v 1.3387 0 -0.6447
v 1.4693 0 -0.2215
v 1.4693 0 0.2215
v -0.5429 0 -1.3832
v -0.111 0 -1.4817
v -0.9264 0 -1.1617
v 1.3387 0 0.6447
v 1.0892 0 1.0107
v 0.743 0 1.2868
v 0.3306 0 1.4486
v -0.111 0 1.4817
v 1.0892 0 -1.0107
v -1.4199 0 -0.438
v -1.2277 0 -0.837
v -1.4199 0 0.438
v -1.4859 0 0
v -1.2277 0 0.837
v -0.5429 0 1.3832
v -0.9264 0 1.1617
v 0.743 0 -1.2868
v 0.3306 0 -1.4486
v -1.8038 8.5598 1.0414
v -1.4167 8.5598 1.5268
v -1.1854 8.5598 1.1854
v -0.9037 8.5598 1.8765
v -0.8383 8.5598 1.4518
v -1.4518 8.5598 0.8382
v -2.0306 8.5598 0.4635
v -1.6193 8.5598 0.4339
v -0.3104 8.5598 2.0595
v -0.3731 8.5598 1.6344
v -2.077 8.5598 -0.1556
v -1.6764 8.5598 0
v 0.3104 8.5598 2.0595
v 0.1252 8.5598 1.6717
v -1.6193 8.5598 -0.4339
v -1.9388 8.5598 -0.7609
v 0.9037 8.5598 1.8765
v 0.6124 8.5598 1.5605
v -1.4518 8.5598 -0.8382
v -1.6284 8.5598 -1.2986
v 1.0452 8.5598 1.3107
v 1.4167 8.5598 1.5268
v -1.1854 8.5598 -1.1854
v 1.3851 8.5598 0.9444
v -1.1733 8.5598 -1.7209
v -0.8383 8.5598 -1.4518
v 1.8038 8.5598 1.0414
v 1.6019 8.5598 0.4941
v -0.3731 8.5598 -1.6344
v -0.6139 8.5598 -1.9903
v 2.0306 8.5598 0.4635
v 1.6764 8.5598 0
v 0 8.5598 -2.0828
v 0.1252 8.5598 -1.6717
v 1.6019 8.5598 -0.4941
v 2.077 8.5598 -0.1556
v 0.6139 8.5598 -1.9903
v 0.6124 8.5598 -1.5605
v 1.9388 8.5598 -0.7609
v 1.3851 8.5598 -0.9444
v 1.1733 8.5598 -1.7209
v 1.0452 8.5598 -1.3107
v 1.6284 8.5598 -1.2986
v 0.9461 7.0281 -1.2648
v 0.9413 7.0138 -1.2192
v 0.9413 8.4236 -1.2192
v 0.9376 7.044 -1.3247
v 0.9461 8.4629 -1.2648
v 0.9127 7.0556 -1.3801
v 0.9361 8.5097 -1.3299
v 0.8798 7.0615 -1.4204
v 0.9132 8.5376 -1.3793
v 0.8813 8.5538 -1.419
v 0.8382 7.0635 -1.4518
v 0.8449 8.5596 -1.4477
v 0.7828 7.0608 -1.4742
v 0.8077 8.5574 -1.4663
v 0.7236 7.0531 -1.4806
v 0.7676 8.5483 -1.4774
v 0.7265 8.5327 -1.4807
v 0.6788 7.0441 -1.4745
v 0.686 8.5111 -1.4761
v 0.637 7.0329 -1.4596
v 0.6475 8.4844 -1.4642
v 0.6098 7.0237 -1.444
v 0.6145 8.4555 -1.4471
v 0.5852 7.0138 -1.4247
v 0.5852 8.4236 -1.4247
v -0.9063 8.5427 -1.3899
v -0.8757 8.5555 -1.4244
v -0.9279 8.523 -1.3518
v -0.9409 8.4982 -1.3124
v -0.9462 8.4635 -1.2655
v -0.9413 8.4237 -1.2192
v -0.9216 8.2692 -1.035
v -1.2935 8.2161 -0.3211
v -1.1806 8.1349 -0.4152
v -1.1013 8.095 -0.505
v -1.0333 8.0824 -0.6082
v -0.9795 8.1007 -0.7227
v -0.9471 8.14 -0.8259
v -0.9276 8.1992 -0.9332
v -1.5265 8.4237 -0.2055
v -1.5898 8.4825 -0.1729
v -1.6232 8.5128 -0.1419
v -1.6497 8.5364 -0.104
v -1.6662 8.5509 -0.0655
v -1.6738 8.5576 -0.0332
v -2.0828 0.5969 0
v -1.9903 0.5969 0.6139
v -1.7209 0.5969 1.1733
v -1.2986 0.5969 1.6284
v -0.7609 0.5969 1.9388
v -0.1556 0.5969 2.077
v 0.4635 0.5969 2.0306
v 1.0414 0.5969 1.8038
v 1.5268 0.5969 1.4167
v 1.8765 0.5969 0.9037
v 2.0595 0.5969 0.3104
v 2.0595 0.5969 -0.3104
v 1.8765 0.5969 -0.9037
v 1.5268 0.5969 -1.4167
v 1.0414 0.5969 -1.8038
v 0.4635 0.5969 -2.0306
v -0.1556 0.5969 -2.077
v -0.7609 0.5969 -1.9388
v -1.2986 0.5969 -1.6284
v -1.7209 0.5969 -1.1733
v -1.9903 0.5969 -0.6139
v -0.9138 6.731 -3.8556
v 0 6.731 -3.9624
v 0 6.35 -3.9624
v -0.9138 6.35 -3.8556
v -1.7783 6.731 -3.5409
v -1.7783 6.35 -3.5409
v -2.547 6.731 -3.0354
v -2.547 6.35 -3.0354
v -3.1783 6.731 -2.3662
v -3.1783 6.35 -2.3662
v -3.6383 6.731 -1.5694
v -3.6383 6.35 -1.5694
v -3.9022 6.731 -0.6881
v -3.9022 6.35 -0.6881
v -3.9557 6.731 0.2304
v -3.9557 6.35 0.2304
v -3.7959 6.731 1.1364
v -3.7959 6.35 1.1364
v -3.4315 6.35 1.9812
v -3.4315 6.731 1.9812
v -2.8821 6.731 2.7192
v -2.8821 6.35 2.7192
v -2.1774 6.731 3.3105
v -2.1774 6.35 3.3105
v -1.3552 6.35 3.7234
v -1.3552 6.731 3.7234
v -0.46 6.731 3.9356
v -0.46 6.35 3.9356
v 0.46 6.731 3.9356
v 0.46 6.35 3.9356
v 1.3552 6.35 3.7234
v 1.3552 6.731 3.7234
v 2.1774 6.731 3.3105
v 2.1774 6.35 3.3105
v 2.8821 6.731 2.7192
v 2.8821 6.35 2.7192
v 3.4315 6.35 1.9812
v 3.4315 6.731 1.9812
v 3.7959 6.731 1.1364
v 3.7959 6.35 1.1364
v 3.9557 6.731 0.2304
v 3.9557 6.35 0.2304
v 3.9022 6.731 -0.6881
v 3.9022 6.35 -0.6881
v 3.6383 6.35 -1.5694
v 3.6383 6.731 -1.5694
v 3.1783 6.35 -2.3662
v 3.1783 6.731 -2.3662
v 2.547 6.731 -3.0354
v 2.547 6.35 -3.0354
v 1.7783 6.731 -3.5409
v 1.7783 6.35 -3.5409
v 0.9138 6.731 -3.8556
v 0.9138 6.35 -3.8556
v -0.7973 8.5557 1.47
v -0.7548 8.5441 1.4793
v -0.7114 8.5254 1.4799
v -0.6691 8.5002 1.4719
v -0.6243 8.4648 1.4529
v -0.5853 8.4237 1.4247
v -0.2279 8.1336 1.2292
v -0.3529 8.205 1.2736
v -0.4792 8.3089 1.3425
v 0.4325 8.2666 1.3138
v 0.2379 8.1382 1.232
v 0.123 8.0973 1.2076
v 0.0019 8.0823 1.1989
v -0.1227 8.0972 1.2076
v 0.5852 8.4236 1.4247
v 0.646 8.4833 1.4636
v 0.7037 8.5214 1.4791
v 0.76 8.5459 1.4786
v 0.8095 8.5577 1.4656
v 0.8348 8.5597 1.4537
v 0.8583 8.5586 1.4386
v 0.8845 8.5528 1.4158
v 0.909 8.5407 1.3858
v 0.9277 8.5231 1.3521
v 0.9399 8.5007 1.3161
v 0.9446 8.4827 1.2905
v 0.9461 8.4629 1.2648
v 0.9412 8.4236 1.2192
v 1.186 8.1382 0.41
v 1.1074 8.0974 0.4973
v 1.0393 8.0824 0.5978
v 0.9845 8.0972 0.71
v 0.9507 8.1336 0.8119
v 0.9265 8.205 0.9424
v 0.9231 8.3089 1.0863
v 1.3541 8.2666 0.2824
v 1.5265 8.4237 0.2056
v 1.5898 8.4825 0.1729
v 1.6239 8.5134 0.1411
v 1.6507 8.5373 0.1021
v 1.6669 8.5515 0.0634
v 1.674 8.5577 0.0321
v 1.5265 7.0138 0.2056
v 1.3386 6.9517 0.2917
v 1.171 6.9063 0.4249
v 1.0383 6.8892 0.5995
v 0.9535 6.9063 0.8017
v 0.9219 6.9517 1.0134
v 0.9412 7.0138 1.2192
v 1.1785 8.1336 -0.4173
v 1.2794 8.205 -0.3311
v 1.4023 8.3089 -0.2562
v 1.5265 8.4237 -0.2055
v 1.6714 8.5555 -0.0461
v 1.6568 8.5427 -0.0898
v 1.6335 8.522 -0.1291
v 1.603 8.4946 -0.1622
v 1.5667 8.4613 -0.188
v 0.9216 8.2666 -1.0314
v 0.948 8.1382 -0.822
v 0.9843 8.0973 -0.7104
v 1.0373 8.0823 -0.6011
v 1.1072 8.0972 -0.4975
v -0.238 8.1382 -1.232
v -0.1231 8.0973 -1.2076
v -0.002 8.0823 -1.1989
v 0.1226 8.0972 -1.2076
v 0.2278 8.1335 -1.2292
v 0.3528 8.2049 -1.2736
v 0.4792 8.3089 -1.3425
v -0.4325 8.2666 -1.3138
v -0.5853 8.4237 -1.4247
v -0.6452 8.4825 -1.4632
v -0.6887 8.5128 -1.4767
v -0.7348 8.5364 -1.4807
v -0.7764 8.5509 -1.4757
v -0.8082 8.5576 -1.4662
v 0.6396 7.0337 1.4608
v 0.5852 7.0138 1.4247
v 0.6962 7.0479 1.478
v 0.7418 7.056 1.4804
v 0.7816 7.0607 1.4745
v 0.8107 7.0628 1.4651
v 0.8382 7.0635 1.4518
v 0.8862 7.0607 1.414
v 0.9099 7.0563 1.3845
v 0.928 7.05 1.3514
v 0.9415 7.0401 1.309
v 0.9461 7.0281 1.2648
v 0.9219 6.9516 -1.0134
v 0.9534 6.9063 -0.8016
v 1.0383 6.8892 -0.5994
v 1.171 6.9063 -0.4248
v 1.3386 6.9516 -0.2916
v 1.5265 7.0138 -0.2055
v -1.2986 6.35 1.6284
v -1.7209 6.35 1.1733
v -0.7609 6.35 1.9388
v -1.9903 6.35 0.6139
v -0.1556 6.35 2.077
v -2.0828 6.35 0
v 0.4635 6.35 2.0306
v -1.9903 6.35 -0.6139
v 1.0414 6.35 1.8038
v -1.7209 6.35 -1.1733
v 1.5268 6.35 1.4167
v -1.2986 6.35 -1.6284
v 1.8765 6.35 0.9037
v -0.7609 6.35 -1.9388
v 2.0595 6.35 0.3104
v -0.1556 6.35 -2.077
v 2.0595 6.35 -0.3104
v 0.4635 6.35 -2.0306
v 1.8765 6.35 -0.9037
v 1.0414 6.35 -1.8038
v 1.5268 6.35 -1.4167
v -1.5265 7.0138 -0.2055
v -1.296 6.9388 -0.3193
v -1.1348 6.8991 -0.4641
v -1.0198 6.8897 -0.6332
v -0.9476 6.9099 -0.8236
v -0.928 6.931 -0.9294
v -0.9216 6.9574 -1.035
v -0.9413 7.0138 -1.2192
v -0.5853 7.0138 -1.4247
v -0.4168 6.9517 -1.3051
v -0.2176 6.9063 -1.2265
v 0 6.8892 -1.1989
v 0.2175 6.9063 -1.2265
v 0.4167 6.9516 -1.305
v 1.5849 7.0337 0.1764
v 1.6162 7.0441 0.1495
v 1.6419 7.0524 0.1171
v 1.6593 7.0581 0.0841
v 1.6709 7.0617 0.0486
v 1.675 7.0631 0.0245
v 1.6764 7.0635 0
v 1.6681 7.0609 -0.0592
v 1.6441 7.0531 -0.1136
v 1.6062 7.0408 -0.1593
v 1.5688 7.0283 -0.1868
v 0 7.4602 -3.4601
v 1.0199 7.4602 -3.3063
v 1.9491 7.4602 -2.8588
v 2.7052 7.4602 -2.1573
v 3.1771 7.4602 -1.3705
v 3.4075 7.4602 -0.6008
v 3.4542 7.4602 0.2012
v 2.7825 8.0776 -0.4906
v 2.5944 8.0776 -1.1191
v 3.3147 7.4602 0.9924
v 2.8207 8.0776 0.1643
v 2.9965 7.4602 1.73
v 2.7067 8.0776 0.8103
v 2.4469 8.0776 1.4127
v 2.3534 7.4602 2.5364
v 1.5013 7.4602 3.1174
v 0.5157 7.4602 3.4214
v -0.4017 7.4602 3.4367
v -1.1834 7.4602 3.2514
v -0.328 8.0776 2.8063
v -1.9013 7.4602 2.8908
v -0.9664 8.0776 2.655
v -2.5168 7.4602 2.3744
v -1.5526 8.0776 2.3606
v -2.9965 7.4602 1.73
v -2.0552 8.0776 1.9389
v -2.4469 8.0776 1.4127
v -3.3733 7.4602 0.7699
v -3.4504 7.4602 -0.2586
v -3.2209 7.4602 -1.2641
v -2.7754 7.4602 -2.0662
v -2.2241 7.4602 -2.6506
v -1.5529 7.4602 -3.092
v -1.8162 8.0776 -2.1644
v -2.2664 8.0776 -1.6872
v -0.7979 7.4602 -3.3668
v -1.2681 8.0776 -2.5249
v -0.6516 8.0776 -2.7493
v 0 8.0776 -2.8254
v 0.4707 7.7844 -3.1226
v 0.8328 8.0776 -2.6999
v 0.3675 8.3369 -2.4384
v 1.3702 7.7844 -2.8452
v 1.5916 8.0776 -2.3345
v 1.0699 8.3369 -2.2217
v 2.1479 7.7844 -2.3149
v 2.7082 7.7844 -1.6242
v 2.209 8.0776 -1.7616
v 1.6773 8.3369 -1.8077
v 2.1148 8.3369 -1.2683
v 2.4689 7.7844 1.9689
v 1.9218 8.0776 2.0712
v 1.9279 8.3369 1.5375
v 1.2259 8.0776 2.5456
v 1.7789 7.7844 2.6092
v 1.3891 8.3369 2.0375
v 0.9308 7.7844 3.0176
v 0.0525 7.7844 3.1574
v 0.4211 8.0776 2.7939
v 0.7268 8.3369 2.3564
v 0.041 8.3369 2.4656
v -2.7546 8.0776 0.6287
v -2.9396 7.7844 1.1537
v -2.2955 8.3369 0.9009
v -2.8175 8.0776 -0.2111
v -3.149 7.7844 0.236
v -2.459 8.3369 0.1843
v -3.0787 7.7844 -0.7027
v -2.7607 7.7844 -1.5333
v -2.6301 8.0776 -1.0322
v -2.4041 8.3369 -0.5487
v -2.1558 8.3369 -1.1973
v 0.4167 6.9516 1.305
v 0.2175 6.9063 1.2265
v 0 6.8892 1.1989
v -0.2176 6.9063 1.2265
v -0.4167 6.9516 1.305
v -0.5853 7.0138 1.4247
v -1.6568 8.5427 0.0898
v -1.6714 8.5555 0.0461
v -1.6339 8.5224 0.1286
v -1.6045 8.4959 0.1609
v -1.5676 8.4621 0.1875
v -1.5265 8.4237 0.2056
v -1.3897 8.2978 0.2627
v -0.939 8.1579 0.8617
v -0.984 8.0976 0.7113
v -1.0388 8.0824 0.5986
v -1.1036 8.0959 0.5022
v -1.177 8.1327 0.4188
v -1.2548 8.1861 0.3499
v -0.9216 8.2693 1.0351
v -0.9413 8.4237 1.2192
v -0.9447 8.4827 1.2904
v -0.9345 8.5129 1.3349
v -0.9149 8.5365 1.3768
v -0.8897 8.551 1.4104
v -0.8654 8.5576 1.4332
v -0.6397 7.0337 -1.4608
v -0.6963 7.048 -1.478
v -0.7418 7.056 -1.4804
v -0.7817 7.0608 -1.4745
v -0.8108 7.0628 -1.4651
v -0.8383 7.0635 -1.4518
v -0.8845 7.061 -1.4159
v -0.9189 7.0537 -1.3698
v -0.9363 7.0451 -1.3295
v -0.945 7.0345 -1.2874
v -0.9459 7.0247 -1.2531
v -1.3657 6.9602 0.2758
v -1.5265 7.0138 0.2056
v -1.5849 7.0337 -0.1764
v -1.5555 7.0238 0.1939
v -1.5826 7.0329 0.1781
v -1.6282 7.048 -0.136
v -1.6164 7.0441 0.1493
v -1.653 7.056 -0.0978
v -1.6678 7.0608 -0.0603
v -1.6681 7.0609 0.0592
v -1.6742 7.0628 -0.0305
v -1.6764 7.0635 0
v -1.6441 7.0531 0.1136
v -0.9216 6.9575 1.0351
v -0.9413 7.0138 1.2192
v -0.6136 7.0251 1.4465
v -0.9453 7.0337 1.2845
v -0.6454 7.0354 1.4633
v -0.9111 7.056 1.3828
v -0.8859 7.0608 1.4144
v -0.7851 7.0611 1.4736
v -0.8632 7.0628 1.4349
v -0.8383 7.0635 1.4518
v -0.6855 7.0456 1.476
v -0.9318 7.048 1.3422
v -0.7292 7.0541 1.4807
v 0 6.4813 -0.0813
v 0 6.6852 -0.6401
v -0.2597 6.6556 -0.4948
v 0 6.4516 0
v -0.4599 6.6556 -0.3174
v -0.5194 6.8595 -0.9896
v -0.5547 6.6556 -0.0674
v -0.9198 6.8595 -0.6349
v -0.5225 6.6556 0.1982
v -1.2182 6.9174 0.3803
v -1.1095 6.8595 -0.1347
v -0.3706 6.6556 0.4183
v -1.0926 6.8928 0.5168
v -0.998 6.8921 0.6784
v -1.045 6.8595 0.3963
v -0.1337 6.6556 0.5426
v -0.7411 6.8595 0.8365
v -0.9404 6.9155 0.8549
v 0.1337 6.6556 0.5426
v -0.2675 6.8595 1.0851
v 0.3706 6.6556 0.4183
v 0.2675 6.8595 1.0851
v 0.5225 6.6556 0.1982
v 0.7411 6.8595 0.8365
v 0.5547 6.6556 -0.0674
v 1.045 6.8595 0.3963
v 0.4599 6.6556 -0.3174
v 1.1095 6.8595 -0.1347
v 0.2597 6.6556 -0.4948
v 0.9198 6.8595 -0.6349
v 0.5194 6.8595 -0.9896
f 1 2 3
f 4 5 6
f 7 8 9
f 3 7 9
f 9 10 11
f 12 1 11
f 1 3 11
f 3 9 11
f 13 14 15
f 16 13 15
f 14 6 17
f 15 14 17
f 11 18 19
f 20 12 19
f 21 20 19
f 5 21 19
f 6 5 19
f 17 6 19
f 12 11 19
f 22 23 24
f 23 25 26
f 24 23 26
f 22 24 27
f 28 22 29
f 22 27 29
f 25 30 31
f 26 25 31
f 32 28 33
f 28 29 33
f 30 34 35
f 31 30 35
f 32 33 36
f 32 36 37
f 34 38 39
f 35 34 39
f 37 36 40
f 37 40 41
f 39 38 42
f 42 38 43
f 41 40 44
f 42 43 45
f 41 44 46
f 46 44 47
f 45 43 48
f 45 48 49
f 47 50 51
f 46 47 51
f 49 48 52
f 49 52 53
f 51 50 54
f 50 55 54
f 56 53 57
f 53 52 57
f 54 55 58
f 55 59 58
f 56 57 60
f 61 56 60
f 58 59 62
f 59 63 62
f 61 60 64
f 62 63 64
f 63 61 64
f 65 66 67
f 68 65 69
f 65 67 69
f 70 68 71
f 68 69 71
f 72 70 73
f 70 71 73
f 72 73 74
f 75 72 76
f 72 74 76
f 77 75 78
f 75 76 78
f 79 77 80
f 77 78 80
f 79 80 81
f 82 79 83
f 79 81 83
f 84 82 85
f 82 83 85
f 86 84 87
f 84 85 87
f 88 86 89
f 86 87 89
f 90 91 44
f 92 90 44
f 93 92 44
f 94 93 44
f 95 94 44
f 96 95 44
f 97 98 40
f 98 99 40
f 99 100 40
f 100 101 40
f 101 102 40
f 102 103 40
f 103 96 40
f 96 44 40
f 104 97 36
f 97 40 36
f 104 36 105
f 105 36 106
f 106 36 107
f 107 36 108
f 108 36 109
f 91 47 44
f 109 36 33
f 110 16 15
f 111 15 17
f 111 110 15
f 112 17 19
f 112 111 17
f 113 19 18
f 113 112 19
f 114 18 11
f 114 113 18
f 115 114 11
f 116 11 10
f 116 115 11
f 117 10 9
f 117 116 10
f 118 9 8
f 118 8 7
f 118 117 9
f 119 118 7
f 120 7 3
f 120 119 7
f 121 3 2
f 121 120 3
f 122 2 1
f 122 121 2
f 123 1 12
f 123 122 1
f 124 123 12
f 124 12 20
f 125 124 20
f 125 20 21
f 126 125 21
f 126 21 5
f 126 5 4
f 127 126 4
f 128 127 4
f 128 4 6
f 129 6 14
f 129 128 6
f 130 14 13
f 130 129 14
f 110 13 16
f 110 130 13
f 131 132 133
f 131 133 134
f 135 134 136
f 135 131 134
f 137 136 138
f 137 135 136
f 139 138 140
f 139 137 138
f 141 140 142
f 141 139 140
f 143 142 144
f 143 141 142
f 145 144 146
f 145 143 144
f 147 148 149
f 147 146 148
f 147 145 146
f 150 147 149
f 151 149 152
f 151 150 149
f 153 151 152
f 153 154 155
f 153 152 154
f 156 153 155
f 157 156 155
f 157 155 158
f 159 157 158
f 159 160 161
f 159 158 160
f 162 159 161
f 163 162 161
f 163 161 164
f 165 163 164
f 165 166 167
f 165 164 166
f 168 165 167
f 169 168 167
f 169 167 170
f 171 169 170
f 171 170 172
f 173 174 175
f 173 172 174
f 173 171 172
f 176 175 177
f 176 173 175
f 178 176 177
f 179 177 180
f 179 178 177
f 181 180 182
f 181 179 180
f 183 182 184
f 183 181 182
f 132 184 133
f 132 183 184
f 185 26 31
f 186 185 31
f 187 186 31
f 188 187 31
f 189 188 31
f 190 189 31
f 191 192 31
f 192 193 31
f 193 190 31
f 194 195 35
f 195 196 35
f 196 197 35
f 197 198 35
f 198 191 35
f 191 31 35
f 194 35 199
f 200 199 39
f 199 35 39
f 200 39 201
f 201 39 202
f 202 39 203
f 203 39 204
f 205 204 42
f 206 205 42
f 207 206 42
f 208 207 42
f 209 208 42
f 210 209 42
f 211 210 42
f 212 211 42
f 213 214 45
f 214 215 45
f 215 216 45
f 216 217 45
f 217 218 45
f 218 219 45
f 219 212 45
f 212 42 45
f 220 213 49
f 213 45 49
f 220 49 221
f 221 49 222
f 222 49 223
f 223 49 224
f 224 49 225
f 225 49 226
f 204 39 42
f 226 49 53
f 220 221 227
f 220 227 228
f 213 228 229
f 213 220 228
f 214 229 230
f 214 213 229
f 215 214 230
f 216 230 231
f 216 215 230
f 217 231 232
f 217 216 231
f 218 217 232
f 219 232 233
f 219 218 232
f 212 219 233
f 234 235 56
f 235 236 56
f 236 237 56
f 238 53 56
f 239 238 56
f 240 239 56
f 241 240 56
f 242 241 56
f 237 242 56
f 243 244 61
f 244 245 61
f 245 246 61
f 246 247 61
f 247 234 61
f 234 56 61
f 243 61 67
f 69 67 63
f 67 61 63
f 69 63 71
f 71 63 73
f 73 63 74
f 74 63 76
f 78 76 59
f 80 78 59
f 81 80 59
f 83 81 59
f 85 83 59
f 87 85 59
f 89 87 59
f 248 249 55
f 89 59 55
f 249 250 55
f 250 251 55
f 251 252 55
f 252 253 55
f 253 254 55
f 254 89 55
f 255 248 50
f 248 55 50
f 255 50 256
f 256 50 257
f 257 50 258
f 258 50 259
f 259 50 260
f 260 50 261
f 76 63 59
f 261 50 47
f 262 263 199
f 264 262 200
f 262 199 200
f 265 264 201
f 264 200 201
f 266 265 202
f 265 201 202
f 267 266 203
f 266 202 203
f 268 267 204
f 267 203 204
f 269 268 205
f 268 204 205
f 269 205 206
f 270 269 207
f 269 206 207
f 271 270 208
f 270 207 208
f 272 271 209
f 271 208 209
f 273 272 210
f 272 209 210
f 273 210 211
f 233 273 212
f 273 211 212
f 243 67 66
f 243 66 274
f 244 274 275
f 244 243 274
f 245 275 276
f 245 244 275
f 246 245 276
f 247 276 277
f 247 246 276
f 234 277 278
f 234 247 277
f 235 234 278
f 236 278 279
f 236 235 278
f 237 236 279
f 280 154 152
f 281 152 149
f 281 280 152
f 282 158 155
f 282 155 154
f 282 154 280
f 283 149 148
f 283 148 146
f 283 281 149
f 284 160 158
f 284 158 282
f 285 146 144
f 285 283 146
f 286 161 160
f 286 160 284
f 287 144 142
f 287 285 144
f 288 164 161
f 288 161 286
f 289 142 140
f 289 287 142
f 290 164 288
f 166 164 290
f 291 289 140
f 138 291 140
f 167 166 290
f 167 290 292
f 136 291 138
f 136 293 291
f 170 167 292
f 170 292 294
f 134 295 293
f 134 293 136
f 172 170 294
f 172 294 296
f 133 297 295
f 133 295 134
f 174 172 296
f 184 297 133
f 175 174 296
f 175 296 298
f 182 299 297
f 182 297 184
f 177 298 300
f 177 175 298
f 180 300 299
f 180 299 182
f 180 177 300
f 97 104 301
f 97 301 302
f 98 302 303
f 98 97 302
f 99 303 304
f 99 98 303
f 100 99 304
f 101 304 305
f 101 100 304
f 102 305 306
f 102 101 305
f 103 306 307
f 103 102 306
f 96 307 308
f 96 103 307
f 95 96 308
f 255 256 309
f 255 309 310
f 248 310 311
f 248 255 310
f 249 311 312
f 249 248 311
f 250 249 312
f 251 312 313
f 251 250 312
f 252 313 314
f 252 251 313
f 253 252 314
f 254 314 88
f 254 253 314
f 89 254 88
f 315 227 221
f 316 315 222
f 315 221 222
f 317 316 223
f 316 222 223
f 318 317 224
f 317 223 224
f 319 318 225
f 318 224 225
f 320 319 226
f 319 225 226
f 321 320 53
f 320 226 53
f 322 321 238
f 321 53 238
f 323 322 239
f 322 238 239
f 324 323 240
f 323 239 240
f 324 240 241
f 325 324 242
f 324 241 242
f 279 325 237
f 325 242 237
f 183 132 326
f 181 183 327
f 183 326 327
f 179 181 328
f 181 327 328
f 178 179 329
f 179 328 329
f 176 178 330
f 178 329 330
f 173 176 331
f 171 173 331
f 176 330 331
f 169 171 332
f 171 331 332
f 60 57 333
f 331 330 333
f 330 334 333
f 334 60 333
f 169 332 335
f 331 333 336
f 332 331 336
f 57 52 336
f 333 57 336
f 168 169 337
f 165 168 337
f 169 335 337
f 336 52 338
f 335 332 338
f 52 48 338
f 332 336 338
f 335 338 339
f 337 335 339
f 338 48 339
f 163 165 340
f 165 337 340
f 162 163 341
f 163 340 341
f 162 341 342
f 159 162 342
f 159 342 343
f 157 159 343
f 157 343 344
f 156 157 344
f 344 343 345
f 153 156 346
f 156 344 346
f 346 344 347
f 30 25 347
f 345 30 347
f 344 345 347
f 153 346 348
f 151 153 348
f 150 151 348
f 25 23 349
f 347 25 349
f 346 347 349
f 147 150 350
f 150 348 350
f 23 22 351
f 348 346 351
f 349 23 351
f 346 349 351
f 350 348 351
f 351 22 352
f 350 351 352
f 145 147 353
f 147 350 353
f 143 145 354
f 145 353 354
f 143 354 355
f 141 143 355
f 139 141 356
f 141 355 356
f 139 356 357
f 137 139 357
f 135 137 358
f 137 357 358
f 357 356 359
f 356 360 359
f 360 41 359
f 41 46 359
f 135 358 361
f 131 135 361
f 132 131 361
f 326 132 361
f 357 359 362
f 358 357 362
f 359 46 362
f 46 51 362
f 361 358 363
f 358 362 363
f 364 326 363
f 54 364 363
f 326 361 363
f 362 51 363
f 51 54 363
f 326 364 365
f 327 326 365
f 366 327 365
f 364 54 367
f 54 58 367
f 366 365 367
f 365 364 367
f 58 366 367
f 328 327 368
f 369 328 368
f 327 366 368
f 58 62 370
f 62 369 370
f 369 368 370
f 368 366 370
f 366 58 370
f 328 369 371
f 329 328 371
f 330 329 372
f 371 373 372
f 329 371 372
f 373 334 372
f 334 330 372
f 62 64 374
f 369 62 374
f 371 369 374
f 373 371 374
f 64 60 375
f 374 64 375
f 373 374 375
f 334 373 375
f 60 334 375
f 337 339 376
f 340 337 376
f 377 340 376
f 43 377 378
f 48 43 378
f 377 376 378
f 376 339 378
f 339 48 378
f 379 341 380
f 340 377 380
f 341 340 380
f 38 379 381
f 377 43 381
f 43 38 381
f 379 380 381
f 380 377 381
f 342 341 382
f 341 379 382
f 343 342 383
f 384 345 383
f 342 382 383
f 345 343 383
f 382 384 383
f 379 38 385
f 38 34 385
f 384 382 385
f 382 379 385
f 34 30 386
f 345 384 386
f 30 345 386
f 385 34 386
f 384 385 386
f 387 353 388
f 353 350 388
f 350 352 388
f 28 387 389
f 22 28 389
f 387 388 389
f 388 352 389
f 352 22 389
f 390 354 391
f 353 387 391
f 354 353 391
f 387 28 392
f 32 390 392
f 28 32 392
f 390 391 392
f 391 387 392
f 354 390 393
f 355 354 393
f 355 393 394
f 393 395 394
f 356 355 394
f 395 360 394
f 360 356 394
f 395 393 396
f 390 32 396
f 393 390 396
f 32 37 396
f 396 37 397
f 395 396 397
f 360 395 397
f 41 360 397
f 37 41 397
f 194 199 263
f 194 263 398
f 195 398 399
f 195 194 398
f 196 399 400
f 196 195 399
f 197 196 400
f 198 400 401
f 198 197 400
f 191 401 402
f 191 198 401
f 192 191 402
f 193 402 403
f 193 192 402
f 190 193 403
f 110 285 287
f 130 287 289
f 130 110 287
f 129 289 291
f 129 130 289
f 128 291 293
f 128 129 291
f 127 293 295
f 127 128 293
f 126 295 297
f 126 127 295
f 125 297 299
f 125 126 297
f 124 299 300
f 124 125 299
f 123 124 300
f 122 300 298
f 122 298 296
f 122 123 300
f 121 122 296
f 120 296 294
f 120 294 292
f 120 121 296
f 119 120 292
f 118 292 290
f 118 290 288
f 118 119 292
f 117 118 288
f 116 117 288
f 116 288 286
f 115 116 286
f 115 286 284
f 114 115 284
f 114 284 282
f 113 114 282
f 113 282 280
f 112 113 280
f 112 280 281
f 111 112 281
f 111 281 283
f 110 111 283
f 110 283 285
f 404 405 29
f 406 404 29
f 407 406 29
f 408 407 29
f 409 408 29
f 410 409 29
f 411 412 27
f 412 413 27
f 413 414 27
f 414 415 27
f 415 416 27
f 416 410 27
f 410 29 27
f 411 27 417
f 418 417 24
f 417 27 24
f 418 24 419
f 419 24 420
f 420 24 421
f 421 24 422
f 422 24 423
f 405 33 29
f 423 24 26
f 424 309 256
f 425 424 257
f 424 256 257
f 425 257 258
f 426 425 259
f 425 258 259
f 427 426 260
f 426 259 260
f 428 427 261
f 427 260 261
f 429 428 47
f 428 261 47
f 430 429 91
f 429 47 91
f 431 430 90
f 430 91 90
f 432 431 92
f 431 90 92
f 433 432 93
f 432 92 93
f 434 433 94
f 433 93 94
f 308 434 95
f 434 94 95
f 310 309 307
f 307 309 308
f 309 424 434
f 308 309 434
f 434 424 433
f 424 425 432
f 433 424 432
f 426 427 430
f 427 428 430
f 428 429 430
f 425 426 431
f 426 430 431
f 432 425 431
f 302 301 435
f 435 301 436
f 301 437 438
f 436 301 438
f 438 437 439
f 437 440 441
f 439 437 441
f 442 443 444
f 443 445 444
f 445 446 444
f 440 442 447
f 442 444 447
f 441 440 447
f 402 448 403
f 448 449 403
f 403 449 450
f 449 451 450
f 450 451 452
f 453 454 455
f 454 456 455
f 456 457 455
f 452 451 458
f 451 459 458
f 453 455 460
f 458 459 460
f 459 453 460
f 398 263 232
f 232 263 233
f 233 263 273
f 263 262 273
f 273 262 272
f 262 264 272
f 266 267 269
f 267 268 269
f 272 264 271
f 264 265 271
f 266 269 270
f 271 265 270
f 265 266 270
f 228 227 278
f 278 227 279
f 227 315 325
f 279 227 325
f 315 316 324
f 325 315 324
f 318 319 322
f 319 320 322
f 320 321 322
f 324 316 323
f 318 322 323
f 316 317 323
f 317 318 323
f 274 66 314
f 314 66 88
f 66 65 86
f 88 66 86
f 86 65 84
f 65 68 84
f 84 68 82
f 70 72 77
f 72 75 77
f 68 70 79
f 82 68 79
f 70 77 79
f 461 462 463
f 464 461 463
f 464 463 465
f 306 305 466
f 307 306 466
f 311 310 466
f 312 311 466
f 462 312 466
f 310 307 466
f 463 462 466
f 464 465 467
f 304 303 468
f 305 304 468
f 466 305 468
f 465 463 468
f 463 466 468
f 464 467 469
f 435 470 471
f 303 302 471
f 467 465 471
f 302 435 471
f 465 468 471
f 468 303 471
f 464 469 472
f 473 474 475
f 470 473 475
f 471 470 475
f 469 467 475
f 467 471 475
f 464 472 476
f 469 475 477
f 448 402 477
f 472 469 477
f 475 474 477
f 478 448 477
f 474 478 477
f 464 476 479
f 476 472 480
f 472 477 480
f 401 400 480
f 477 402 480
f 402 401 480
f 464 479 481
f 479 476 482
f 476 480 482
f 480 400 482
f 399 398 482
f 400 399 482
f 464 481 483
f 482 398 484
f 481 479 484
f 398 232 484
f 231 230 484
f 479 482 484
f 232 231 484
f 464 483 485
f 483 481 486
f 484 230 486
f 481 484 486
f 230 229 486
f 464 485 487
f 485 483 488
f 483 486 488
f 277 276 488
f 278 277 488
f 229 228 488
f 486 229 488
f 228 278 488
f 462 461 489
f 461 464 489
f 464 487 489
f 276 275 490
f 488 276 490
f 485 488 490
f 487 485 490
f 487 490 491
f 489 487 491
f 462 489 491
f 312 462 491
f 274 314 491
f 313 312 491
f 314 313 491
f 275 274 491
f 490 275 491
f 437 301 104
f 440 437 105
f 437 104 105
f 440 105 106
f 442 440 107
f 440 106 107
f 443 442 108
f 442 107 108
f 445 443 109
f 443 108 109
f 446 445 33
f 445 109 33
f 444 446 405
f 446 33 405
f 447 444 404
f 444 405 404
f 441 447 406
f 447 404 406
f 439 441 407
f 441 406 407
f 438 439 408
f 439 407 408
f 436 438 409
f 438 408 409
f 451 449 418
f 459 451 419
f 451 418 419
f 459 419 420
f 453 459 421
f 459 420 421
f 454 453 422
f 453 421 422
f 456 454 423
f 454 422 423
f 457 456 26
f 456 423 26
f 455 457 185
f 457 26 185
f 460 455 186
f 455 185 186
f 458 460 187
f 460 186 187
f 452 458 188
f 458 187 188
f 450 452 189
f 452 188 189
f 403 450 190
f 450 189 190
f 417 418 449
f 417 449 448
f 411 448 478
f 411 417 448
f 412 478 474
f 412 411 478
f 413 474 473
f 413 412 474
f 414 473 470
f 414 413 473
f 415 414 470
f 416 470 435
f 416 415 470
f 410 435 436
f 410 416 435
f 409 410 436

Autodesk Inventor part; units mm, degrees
ref_plane "YZ Plane" through (0, 0, 0) normal (1, 0, 0) x (0, 1, 0)
ref_plane "XZ Plane" through (0, 0, 0) normal (0, 1, 0) x (-1, 0, 0)
ref_plane "XY Plane" through (0, 0, 0) normal (0, 0, 1) x (1, 0, 0)
sketch "Sketch1" plane through (0, 0, 0) normal (0, 1, 0) x (-1, 0, 0)
  circle A0 centre (0, 0) radius 2.0828
  dimension "d4" = 4.1656
extrude "Body" add sketch "Sketch1" along normal blind 6.35
sketch "Sketch2" plane through (0, 0, 0) normal (1, 0, 0) x (0, 1, 0)
  line L0 (6.35, -2.0828) -> (6.35, 2.0828) projected
  line L1 (6.35, 0) -> (6.35, -3.9624)
  line L2 (6.35, -3.9624) -> (6.731, -3.9624)
  arc A0 (6.731, -3.9624) -> (8.5598, -2.0828) centre (4.5388, 0) ccw
  line L3 (8.5598, -2.0828) -> (8.5598, -1.6764)
  line L4 (8.5598, -1.6764) -> (7.0635, -1.6764)
  line L5 (7.0635, -1.6764) -> (6.4516, 0)
  line L6 (6.4516, 0) -> (6.35, 0)
  point P0 (0, 0)
  dimension "d5" = 3.9624
  dimension "d6" = 0.381
  dimension "d13" = 0.1016
  dimension "d14" = 2.0828
  dimension "d15" = 2.2098
  dimension "d16" = 0
  dimension "d17" = 1.6764
  dimension "d57" = 20.053
revolve "Head" add sketch "Sketch2" angle 360 about axis through (0, 6.4516, 0) along (0, -1, 0)
sketch "Sketch3" plane through (0, 8.5598, 0) normal (0, 1, 0) x (1, 0, 0)
  circle A0 centre (0, 0) radius 1.6764 projected
  line L0 (0.7302, -1.2648) -> (-0.7303, -1.2648) construction
  line L1 (-0.7303, -1.2648) -> (-1.4605, 0) construction
  line L2 (-1.4605, 0) -> (-0.7303, 1.2648) construction
  line L3 (-0.7303, 1.2648) -> (0.7302, 1.2648) construction
  line L4 (0.7302, 1.2648) -> (1.4605, 0) construction
  line L5 (1.4605, 0) -> (0.7302, -1.2648) construction
  circle A1 centre (-0.7303, -1.2648) radius 0.2159
  circle A2 centre (-1.4605, 0) radius 0.2159
  circle A3 centre (-0.7303, 1.2648) radius 0.2159
  circle A4 centre (0.7302, 1.2648) radius 0.2159
  circle A5 centre (1.4605, 0) radius 0.2159
  circle A6 centre (0.7302, -1.2648) radius 0.2159
  circle A7 centre (0, -2.0701) radius 0.8712
  circle A8 centre (0, 2.0701) radius 0.8712
  circle A9 centre (1.7928, -1.0351) radius 0.8712
  circle A10 centre (-1.7928, 1.035) radius 0.8712
  circle A11 centre (1.7928, 1.035) radius 0.8712
  circle A12 centre (-1.7928, -1.0351) radius 0.8712
  circle A13 centre (0, 0) radius 1.8188
  point P0 (0, 0)
  point P1 (0, 0)
  point P2 (0.9413, 1.2192)
  point P3 (1.5265, 0.2056)
  point P4 (1.5265, -0.2056)
  point P5 (0.9413, -1.2192)
  point P6 (0.5852, -1.4248)
  point P7 (-0.5852, -1.4248)
  point P8 (-0.9413, -1.2192)
  point P9 (-1.5265, -0.2056)
  point P10 (-1.5265, 0.2056)
  point P11 (-0.9413, 1.2192)
  point P12 (-0.5852, 1.4248)
  point P13 (0.5852, 1.4248)
  dimension "d58" = 2.921
  dimension "d59" = 4.1402
  dimension "d62" = 120
extrude "Hex" add sketch "Sketch3" against normal blind 1.778 contours A5 A11 A0 | A0 A11 A13 A9 | A0 A9 A5 | A11 A0 | A0 A11 A13 | A9 A13 A0 | A0 A9 | A11 A4 A0 | A0 A8 A13 A11 | A9 A13 A7 A0 | A0 A6 A9 | A4 A8 A0 | A0 A7 A6 | A8 A0 | A7 A0 | A0 A8 A13 | A7 A13 A0 | A3 A0 A8 | A7 A0 A1 | A0 A10 A13 A8 | A7 A13 A12 A0 | A3 A10 A0 | A0 A12 A1 | A10 A0 A13 | A13 A12 A0 | A10 A0 | A0 A12 | A10 A0 A12 A13 | A10 A2 A0 | A0 A2 A12
sketch "Sketch4" plane through (0, 0, 0) normal (0, 0, 1) x (1, 0, 0)
  line L0 (-0.7364, 7.6198) -> (-1.6764, 8.5598)
  line L1 (0, 8.5598) -> (-0.7364, 7.6198)
  line L2 (0, -3.617) -> (0, 21.7018) projected
  line L3 (-1.5265, 8.5598) -> (-1.5265, 7.0138) projected
  line L4 (-1.5265, 8.5598) -> (-1.5265, 8.5598) projected
  line L5 (-1.5265, 8.5598) -> (-1.5265, 7.0138) projected
  line L6 (-1.6764, 8.5598) -> (-1.5265, 8.5598) projected
  line L7 (-1.6764, 8.5598) -> (0, 8.5598)
  point P0 (0, 0)
  point P1 (-1.6764, 7.0635)
  dimension "d29" = 1.6764
revolve "Head Chamfer" cut sketch "Sketch4" angle 360 about axis through (0, -10, 0) along (0, 1, 0)
sketch "Sketch5" plane through (0, 0, 0) normal (1, 0, 0) x (0, 1, 0)
  line L0 (0, -2.0828) -> (6.35, -2.0828) projected
  line L1 (6.35, 3.9624) -> (6.35, -3.9624) projected
  line L2 (6.35, -2.0828) -> (6.35, 2.0828) projected
  line L3 (0.0745, -2.0828) -> (-0.2261, -2.6035)
  line L4 (-0.2261, -2.6035) -> (-0.3253, -2.6035)
  line L5 (-0.3253, -2.6035) -> (-0.626, -2.0828)
  line L6 (0.0686, -2.6035) -> (-0.7252, -2.6035) construction
  line L7 (-0.626, -2.0828) -> (0.0745, -2.0828)
  line L8 (0, -2.0828) -> (6.35, -2.0828) projected
  point P0 (0, 0)
  dimension "d31" = 30
  dimension "d32" = 60
  dimension "a" = 0.0992
  dimension "d46" = 0.7937
  dimension "d54" = 0.0686
  dimension "d55" = 0.5207
  dimension "d56" = 0.0992
feature "Thread" [suppressed]
sketch "Sketch6" plane through (0, 0, 0) normal (0, 0, 1) x (1, 0, 0)
  line L0 (0, 0) -> (-1.4859, 0)
  line L1 (2.0828, 0) -> (-2.0828, 0) projected
  line L2 (-1.4859, 0) -> (-2.4948, 1.0089)
  line L3 (-2.4948, 1.0089) -> (-2.9651, -1.2188)
  line L4 (-2.9651, -1.2188) -> (-1.4859, -1.2188)
  line L5 (-2.0828, 0) -> (-2.0828, 6.35) projected
  line L6 (-1.4859, -1.2188) -> (-1.4859, 0)
  line L7 (0, -4.6376) -> (0, 19.2938) projected
  point P0 (-2.0828, 0.5969)
  dimension "d49" = 1.4859
  dimension "d50" = 135
revolve "Tapered End" cut sketch "Sketch6" angle 360 about axis through (0, -10, 0) along (0, 1, 0)
equation "\"d56\" = a"
properties part number "Screw 8-32 Steel 2.500" material "VEX Steel"
